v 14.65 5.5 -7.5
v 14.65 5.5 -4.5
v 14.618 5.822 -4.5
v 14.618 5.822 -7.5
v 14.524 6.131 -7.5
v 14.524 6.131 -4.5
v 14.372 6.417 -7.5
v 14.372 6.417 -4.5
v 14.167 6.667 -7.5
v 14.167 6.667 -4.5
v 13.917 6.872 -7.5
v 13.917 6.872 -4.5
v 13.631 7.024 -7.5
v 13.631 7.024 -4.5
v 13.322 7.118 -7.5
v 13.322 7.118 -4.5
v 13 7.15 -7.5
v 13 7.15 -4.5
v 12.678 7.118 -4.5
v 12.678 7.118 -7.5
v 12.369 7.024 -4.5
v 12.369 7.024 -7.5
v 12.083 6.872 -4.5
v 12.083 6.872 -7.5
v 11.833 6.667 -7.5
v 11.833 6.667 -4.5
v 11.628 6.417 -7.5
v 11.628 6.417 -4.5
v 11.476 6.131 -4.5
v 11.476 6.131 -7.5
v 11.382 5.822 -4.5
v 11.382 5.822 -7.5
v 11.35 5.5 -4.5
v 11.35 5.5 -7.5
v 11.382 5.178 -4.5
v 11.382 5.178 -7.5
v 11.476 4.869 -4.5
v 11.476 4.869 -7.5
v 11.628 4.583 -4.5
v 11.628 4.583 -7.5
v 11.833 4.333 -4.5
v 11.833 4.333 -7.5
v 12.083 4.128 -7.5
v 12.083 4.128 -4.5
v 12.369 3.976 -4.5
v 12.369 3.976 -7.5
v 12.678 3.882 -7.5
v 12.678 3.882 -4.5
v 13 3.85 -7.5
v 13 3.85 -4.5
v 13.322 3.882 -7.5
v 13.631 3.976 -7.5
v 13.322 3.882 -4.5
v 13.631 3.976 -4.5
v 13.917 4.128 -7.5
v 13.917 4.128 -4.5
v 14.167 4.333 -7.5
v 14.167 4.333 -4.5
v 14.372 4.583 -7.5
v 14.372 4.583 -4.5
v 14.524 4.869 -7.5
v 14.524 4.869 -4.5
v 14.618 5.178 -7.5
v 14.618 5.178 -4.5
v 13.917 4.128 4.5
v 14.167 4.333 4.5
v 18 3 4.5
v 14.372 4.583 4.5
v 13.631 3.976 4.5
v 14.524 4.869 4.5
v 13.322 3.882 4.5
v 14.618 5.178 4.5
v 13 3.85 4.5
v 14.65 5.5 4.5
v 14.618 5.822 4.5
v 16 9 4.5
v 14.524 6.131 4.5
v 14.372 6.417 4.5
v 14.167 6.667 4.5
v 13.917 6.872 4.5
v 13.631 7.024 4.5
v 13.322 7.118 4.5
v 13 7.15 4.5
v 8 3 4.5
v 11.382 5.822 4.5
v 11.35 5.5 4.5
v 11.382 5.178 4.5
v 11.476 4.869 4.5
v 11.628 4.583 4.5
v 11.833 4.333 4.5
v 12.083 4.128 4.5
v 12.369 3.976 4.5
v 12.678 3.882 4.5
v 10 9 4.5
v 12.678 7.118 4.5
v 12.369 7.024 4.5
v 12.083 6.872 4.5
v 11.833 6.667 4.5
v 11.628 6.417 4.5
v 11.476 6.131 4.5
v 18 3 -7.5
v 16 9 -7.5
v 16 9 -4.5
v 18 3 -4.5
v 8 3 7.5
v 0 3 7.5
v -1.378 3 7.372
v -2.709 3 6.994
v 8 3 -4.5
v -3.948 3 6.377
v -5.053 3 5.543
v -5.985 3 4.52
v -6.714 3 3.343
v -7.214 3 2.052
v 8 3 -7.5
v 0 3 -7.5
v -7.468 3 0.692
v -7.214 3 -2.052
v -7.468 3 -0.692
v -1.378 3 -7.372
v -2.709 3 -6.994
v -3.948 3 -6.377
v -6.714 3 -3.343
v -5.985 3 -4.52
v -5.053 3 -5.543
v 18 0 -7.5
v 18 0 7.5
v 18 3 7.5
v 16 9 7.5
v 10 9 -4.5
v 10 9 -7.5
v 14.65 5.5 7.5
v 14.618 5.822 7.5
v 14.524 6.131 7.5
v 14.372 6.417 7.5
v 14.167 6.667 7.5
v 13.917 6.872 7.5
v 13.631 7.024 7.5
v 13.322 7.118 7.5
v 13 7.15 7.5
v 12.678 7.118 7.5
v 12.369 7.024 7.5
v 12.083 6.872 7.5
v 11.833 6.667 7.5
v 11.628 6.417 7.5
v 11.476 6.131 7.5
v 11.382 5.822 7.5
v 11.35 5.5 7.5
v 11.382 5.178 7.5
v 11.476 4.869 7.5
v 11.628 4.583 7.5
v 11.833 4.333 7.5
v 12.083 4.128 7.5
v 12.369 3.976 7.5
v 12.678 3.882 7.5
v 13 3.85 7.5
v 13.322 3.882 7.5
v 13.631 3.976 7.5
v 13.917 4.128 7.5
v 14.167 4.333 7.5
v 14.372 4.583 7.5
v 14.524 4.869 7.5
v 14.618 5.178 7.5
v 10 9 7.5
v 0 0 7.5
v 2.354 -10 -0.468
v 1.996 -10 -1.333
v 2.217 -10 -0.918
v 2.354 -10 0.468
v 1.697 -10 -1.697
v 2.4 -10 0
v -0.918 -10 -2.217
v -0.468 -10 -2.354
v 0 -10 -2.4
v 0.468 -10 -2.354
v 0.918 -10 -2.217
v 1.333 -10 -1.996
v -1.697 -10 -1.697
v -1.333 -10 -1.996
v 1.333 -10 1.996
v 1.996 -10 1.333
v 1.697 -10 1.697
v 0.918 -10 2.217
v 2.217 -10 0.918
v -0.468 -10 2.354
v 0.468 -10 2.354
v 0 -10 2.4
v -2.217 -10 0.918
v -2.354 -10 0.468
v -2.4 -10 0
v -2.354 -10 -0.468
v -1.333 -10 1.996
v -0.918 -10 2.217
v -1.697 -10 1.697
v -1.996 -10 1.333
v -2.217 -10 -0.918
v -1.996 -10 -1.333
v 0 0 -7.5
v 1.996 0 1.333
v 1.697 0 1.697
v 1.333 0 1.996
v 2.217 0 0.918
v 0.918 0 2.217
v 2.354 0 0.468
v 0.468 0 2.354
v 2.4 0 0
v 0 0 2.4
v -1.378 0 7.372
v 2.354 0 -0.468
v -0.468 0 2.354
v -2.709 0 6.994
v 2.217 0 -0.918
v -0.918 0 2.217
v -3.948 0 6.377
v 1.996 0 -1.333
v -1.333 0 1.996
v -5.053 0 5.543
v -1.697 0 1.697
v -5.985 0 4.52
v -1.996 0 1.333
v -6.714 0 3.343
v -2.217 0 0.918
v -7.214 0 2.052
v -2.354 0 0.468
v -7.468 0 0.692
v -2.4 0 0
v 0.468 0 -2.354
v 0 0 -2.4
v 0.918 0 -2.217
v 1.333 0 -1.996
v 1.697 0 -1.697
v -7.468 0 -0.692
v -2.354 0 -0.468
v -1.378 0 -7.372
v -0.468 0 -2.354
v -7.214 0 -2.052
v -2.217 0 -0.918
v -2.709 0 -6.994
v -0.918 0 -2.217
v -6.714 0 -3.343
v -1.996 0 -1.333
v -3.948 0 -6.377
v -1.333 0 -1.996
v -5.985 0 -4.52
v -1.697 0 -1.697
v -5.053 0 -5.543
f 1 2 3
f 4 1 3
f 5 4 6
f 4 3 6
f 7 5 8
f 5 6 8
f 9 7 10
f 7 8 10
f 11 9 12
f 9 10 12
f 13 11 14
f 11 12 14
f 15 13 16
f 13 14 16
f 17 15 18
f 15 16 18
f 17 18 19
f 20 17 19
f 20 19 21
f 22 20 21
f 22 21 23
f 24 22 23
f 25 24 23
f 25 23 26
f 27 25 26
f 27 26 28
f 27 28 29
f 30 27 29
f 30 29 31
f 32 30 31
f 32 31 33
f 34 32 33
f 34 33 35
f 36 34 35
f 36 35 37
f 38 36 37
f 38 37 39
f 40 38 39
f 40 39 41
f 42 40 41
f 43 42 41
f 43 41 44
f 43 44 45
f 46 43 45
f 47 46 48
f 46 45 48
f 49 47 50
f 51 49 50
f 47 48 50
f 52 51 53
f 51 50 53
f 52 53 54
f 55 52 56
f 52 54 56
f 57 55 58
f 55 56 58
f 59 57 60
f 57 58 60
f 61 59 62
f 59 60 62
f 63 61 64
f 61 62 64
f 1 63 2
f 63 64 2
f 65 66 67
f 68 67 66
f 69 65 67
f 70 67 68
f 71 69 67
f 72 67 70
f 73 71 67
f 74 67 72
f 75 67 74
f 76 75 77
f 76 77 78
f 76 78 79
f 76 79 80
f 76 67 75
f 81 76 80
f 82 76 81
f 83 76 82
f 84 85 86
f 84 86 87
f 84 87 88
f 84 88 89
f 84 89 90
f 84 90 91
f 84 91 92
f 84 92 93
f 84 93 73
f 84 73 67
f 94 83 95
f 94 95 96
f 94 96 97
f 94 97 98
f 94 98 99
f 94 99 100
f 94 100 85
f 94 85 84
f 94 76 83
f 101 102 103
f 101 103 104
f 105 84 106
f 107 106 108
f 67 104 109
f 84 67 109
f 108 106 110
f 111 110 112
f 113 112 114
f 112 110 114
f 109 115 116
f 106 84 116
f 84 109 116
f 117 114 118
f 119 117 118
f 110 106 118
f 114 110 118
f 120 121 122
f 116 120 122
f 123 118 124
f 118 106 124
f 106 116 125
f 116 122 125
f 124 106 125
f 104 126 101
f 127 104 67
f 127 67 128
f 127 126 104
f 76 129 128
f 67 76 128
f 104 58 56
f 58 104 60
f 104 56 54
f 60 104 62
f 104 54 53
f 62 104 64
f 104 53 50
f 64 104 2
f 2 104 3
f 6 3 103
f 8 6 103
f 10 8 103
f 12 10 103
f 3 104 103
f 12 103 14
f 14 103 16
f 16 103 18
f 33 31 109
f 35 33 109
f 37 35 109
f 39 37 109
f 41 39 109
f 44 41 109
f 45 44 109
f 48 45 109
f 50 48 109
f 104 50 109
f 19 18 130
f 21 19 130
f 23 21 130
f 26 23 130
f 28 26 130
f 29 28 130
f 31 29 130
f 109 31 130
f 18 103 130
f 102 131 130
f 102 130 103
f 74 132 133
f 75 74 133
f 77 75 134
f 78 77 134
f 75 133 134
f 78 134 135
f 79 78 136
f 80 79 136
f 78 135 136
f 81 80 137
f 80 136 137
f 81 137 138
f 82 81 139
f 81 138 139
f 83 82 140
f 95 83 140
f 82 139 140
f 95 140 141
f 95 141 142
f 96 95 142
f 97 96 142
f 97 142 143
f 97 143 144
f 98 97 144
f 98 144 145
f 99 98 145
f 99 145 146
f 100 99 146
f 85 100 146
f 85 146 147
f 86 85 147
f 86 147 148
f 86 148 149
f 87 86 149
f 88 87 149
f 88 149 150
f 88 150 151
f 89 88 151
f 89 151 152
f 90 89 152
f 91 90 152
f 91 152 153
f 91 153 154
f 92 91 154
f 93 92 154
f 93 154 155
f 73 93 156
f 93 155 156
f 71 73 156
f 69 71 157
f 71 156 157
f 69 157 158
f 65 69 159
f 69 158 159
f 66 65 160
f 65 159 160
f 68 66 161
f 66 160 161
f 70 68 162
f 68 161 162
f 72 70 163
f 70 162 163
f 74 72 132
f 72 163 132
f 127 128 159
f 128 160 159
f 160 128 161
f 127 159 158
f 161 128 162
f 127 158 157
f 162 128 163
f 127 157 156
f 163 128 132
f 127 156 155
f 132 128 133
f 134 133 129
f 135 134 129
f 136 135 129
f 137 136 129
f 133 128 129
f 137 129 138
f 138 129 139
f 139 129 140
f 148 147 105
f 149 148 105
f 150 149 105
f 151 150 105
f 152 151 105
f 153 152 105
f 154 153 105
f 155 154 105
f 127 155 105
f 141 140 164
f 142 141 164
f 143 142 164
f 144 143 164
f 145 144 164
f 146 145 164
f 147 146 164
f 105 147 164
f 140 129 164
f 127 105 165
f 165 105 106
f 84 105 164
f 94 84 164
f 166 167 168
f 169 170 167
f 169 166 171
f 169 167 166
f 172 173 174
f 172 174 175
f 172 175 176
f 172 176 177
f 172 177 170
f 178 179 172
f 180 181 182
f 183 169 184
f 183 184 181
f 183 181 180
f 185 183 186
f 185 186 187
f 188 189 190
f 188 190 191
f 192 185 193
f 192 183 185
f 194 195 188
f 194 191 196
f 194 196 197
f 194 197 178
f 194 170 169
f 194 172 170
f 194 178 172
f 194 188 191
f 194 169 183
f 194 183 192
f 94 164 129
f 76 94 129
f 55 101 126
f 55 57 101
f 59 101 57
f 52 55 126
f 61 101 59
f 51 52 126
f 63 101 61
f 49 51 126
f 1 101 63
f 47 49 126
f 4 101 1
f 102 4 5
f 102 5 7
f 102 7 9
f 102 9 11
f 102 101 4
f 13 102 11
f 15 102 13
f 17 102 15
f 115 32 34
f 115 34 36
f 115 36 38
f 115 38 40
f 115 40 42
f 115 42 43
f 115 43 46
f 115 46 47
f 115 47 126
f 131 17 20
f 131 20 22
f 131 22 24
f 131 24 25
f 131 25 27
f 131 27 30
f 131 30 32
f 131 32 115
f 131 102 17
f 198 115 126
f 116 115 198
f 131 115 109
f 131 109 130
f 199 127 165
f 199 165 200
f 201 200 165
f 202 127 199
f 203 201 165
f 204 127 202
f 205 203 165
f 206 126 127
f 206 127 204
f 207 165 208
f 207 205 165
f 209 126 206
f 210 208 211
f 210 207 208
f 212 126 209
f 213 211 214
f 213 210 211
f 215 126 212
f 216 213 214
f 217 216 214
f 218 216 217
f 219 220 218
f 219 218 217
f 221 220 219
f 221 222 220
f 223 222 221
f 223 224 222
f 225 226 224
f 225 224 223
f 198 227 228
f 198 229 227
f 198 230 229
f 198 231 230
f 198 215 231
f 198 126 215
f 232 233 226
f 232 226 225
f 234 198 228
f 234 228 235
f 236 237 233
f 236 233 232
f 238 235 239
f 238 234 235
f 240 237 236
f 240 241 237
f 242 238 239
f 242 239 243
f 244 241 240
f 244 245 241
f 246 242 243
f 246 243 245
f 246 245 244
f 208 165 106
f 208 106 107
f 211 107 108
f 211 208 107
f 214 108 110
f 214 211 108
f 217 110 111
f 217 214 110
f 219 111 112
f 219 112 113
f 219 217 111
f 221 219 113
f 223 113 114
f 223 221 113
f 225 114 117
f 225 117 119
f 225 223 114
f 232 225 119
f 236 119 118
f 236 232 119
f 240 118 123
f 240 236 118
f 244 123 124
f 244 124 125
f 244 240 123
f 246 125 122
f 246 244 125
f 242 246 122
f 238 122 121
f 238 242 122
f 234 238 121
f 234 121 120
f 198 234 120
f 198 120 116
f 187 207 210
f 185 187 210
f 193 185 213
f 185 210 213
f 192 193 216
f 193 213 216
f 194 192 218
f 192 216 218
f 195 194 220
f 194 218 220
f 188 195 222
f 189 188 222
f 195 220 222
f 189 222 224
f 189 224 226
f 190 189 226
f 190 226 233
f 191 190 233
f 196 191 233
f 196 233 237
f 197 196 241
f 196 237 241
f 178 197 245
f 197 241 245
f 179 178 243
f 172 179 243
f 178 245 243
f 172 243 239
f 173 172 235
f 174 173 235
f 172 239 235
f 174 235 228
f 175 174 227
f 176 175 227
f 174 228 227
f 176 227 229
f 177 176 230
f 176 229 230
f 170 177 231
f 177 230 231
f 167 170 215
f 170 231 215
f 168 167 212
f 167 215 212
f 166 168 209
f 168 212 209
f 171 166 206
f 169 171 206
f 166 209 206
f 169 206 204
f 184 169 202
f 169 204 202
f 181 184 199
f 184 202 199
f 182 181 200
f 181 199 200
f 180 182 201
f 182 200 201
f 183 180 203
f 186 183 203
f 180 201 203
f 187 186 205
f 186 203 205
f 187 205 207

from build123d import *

# Parameters (mm, degrees)
EXTRUDE_1_DEPTH     = 3
SKETCH_2_R          = 2.4
EXTRUDE_2_DEPTH     = 10
EXTRUDE_3_DEPTH     = 3
SKETCH_4_R          = 1.65
CUT_EXTRUDE_1_DEPTH = 26.475478406


with BuildPart() as part:
    # 草图1 → 凸台-拉伸1 (new body)
    with BuildSketch(Plane(origin=(0, 0, 0), x_dir=(1, 0, 0), z_dir=(0, 1, 0))):
        with BuildLine():
            Line((0, 7.5), (18, 7.5))
            Line((18, 7.5), (18, -7.5))
            Line((18, -7.5), (0, -7.5))
            ThreePointArc((0, -7.5), (-7.5, 0), (0, 7.5))
        make_face()
    extrude(amount=EXTRUDE_1_DEPTH)

    # 草图2 → 凸台-拉伸2 (add)
    with BuildSketch(Plane.XZ):
        with Locations(Location((0, 0, 0), (0, 0, 90))):
            Circle(SKETCH_2_R)
    extrude(amount=EXTRUDE_2_DEPTH)

    # 草图3 → 凸台-拉伸3 (add)
    with BuildSketch(Plane.XY.offset(7.5)):
        Polygon((18, 3), (8, 3), (10, 9), (16, 9), align=None)
    extrude_3 = extrude(amount=-EXTRUDE_3_DEPTH)

    # 镜向1: 凸台-拉伸3 across plane
    add(extrude_3.mirror(Plane.XY))

    # 草图4 → 切除-拉伸1 (cut, through all)
    with BuildSketch(Plane.XY.offset(7.5)):
        with Locations((13, 5.5)):
            Circle(SKETCH_4_R)
    extrude(amount=-CUT_EXTRUDE_1_DEPTH, mode=Mode.SUBTRACT)


solid = part.part
